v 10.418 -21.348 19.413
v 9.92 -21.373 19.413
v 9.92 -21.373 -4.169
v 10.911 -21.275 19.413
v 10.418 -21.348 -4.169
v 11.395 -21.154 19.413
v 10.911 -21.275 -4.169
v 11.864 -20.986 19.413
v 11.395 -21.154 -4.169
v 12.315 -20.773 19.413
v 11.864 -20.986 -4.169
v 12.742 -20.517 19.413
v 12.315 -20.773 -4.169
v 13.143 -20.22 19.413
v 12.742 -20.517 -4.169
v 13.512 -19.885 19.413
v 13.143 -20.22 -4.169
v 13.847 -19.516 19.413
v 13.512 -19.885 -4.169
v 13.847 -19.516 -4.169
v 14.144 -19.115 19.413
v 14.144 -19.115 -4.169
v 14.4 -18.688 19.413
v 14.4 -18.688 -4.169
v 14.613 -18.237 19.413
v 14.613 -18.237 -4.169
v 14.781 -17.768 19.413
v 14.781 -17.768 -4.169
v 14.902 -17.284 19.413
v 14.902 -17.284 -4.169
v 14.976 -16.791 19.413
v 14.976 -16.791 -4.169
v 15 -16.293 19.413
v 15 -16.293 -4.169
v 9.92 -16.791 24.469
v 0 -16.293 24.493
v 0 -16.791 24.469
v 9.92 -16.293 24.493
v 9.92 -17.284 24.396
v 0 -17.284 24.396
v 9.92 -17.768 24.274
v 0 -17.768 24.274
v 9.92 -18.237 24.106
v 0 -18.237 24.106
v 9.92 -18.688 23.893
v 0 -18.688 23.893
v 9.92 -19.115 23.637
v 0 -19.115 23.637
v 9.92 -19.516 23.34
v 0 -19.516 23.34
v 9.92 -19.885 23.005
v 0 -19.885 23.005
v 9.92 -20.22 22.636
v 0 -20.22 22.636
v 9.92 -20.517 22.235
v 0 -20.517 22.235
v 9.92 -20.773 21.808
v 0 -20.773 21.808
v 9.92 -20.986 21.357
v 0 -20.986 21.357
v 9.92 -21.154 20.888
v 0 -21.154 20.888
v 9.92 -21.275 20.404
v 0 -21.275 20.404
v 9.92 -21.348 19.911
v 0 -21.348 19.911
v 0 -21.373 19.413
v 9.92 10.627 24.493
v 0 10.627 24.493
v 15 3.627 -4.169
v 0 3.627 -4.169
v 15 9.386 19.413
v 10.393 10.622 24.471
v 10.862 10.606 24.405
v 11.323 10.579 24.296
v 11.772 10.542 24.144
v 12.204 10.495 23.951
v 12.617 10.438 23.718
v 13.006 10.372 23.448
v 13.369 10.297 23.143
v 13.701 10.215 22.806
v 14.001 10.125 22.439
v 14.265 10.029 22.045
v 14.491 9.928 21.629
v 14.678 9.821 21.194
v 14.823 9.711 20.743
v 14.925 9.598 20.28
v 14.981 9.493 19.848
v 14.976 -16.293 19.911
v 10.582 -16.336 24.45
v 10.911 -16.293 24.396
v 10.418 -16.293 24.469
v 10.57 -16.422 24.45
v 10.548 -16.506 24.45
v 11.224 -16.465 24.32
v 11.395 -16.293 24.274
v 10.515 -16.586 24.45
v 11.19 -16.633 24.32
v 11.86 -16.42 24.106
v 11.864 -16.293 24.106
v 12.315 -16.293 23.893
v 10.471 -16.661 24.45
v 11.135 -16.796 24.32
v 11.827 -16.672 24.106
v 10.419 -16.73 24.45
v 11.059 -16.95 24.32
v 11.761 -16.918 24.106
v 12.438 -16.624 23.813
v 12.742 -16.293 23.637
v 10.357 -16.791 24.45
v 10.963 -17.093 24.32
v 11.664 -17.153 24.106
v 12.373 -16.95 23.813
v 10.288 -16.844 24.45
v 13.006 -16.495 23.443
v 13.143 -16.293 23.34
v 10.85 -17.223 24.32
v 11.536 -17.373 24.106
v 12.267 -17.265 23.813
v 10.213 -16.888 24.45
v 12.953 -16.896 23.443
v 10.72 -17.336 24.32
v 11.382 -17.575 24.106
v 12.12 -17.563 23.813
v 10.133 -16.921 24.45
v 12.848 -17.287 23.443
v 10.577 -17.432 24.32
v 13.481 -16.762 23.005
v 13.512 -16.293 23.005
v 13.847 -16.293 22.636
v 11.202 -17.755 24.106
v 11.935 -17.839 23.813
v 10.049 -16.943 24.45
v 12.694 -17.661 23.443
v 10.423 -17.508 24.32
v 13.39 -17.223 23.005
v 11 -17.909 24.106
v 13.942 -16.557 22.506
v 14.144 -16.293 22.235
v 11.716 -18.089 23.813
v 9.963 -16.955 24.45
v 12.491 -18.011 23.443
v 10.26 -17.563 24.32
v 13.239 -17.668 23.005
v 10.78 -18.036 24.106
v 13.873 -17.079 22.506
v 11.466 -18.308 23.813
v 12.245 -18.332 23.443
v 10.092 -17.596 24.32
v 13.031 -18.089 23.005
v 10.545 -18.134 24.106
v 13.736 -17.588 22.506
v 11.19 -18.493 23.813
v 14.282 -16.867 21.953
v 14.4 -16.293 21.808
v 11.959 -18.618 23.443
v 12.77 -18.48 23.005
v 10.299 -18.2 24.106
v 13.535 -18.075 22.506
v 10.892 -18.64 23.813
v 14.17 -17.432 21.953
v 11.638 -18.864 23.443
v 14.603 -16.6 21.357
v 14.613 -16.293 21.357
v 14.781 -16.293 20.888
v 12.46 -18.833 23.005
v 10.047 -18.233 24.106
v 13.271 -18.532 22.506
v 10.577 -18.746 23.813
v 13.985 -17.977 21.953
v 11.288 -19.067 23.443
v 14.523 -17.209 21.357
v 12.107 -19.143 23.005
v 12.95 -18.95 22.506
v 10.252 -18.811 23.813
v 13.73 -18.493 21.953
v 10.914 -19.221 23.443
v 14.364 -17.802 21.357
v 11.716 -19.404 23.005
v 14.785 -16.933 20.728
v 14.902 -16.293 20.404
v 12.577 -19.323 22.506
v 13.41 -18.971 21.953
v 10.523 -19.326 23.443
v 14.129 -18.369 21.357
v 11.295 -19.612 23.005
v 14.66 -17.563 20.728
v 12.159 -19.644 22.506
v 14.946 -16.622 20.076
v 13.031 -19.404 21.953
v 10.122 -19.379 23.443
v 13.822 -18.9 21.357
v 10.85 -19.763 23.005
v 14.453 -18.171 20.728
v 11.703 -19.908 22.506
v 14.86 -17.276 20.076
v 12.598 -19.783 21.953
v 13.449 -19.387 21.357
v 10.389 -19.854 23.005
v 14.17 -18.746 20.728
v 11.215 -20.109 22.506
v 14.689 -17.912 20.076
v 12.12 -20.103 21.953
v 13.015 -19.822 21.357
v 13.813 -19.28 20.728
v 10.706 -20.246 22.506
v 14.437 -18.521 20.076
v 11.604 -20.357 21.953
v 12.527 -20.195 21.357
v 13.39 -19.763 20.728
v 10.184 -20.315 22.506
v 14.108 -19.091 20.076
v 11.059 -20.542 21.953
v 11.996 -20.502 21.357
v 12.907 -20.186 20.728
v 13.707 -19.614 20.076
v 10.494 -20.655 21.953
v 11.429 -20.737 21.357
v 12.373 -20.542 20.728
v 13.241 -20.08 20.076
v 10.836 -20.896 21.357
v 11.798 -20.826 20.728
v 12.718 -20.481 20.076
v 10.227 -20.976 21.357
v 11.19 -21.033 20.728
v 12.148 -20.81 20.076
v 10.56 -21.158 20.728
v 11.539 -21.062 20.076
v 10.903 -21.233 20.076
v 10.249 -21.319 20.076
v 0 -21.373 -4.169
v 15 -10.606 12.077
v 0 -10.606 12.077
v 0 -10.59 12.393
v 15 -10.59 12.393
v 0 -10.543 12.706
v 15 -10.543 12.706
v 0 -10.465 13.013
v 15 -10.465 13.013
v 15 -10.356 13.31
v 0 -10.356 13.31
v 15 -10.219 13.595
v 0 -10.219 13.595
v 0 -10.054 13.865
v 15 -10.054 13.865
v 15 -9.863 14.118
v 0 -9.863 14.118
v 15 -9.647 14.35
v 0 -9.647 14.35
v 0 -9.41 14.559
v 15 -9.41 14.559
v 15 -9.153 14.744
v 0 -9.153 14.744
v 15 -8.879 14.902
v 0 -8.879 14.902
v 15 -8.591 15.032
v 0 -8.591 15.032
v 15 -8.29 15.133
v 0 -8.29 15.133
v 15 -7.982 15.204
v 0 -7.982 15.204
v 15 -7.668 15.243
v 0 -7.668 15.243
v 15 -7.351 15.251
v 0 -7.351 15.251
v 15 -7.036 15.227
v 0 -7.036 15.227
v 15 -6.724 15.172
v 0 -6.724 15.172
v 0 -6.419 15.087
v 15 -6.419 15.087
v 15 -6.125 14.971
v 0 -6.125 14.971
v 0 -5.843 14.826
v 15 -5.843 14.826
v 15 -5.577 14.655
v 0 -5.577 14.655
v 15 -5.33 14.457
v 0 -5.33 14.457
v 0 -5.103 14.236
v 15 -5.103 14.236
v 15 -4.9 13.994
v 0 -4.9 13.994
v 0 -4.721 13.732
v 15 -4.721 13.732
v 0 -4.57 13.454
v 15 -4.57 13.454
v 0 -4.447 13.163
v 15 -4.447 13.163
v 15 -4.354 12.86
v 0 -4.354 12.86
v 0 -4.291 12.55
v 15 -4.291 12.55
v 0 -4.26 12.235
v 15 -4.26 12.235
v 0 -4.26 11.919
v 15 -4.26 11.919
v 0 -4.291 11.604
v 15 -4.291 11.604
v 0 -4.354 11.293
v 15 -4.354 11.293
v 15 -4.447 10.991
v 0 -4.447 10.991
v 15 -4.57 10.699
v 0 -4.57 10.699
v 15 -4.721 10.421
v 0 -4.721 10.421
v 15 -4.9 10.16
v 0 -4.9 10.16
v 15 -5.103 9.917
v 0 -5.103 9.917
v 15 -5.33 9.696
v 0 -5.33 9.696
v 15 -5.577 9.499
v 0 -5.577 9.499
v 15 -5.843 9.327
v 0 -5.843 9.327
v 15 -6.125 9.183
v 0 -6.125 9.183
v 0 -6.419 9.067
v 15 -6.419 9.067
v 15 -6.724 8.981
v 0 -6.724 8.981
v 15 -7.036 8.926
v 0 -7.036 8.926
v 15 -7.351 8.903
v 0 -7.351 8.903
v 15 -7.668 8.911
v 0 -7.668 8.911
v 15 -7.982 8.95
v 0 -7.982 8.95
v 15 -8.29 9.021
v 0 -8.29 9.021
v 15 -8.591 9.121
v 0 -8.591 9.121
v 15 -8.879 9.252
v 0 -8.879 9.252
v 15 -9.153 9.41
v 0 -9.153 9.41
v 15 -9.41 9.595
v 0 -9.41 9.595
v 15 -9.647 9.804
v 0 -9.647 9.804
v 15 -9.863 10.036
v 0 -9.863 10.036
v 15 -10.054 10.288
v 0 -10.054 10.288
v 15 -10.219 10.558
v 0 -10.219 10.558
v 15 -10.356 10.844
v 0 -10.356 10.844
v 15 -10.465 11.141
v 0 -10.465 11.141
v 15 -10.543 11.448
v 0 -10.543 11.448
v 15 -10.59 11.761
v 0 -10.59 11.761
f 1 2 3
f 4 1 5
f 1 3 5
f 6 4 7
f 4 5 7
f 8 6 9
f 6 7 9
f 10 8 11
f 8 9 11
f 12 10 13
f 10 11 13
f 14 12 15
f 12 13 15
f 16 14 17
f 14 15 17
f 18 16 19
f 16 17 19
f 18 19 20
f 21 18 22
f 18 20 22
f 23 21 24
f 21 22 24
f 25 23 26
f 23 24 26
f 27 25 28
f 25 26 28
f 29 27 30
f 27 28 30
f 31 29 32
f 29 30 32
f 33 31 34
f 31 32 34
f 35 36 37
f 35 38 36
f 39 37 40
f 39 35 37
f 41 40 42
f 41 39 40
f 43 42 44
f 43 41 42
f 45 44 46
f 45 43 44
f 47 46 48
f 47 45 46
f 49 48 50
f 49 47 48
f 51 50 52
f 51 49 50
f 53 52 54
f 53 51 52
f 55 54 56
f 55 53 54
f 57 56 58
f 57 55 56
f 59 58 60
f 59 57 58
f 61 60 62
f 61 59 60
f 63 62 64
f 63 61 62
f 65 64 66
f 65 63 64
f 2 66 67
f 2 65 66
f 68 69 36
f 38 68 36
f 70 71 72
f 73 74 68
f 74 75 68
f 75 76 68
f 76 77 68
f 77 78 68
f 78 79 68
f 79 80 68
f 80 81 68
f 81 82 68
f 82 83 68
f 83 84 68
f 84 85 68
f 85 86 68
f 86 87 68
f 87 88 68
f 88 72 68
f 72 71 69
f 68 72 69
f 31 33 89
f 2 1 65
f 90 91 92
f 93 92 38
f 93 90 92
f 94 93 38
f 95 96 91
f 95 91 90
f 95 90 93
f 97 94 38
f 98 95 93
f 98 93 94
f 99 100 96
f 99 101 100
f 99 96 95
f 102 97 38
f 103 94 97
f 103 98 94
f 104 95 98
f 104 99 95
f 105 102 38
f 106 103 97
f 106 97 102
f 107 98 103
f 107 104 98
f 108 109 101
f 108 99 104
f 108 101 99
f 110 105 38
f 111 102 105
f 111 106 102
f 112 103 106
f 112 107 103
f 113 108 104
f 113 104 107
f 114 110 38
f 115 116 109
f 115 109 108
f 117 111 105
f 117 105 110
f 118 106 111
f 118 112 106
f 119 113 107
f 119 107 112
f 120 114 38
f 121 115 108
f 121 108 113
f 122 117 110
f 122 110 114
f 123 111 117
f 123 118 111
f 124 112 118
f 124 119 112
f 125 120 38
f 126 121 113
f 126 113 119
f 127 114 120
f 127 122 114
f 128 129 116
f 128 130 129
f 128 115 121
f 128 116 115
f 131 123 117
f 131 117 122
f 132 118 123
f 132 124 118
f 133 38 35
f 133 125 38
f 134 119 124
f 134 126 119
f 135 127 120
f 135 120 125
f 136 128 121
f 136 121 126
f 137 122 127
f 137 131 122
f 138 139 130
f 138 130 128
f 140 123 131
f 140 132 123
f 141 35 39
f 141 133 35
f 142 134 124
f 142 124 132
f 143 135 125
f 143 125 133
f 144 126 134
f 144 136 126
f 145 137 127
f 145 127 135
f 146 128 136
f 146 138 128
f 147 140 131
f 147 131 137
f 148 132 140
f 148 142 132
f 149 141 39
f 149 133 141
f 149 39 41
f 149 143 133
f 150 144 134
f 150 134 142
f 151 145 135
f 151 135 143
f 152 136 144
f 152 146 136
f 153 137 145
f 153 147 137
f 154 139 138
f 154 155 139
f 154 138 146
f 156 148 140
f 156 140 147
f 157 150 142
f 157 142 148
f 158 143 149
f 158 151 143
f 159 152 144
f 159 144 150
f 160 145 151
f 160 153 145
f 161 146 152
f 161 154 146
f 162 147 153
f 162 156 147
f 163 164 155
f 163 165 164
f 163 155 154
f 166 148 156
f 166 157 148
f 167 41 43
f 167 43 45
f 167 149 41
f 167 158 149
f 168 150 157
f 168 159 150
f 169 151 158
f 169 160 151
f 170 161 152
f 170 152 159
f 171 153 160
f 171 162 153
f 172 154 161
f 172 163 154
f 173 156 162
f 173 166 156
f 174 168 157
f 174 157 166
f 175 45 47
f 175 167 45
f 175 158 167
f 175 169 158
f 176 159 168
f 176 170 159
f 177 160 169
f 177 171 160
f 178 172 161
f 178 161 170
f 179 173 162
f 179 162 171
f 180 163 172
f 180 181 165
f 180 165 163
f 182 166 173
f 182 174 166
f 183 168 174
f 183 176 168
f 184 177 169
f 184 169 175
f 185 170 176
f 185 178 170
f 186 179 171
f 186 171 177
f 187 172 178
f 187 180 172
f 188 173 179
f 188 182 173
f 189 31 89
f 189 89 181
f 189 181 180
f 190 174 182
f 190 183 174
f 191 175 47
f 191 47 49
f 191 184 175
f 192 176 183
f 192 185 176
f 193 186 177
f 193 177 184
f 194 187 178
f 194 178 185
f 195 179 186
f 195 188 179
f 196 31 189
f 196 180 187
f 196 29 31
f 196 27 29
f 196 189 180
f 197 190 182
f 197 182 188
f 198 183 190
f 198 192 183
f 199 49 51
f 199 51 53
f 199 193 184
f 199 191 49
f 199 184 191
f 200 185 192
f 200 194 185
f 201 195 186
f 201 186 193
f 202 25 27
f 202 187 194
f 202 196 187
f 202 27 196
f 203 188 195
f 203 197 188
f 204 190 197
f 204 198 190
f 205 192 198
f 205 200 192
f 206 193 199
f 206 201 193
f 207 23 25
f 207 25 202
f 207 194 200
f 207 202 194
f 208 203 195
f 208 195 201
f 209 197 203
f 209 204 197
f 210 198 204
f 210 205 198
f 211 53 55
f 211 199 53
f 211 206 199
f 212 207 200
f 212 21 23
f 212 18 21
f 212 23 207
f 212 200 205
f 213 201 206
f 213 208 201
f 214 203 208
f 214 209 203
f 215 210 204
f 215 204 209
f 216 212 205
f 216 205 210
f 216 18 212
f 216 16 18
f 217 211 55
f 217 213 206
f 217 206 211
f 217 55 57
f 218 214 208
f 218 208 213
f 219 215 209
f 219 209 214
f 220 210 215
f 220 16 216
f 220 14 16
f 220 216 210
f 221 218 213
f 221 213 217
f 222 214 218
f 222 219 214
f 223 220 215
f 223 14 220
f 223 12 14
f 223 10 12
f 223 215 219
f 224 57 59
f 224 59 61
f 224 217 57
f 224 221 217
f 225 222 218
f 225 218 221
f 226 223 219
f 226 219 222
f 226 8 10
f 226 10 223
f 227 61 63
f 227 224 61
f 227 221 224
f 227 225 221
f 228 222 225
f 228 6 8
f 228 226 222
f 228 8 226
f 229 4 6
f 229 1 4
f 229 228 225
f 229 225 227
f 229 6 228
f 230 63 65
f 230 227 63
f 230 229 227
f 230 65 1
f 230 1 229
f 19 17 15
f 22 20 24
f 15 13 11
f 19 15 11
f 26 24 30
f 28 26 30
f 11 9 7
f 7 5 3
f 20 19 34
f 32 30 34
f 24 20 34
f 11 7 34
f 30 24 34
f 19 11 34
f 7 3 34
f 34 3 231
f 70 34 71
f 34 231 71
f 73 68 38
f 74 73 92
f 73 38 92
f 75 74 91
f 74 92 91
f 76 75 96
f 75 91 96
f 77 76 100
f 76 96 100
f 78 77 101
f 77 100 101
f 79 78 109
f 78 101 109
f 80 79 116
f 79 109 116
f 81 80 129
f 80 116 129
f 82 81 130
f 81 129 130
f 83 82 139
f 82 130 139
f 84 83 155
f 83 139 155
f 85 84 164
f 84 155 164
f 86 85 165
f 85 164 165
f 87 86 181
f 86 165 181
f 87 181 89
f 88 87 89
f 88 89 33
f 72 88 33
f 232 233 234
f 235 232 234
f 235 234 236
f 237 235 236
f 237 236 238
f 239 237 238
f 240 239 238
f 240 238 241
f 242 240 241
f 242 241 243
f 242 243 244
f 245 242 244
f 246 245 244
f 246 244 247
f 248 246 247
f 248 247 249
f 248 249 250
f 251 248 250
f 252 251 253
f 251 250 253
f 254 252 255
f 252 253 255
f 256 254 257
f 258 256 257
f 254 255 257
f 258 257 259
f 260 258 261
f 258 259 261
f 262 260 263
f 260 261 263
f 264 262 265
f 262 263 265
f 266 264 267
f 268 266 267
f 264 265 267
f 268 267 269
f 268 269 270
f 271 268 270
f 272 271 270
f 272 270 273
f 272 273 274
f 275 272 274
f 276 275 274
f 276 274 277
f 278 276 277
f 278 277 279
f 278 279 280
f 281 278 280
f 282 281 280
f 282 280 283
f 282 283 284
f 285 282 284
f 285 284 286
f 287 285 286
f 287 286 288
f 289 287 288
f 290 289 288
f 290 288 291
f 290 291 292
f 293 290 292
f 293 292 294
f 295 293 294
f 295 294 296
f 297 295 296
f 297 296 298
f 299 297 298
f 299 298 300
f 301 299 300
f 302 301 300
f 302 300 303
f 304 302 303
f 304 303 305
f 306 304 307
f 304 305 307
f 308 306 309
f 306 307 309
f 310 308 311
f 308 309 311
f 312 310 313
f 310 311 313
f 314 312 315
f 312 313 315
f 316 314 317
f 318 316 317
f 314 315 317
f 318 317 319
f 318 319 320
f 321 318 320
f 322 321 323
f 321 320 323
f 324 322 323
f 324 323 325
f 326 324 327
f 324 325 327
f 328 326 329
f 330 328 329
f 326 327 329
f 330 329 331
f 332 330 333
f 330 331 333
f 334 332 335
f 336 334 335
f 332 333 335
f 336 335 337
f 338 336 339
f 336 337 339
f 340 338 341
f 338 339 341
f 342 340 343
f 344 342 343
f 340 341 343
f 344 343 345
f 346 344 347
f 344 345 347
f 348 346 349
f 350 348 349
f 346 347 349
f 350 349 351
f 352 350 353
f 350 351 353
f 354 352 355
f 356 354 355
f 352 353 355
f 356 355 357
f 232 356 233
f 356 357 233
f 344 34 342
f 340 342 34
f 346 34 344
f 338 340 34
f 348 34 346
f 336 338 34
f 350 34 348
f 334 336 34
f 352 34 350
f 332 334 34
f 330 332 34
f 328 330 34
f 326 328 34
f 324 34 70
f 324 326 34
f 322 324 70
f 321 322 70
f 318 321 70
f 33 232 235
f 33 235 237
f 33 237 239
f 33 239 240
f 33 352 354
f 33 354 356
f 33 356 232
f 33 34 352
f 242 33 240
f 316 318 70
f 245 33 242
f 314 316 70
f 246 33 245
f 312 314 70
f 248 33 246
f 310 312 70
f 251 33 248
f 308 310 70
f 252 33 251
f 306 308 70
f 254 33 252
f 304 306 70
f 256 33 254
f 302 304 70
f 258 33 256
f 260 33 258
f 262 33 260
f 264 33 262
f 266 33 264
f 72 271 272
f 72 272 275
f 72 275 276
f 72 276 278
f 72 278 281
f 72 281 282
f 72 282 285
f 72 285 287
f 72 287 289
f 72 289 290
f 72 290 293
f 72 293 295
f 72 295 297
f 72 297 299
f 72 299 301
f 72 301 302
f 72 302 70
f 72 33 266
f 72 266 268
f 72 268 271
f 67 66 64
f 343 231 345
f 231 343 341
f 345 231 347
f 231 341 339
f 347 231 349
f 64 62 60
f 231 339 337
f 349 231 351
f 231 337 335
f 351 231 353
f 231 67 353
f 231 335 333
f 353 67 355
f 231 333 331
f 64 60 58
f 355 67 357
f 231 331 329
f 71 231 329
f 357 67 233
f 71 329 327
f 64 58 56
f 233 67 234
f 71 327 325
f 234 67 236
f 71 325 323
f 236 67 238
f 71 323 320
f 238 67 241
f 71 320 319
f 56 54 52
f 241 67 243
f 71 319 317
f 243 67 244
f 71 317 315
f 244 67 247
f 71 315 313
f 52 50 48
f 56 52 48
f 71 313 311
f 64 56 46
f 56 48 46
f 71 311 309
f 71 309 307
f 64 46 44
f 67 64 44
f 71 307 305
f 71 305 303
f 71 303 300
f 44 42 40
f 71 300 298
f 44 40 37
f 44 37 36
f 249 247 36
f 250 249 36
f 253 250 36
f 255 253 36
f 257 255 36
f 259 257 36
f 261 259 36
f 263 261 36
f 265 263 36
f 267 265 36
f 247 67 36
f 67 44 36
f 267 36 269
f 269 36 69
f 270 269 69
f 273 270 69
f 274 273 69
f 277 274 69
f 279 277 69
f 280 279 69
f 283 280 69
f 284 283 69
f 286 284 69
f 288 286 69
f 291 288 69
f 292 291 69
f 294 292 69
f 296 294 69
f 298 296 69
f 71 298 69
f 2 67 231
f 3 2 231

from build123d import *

# Parameters (mm, degrees)
F1_DEPTH = 15
F2_R     = 5.08
F4_D     = 6.35


with BuildPart() as f1:
    # F0 (on Right) → F1 (new body)
    with BuildSketch(Plane.YZ):
        Polygon((10.627066, 24.493142), (-21.372934, 24.493142), (-21.372934, -4.169433), (3.627066, -4.169433), align=None)
    extrude(amount=F1_DEPTH)

    # F2
    f2_edges = [f1.edges().sort_by_distance(p)[0] for p in [
        (15, -21.372934, 10.161854),
        (15, -5.372934, 24.493142),
        (7.5, -21.372934, 24.493142),
    ]]
    fillet(f2_edges, radius=F2_R)

    # F4 (through all)
    with Locations(Plane.YZ.offset(15)):
        with Locations((-7.430566, 12.076859)):
            Hole(F4_D / 2)


solid = f1.part
